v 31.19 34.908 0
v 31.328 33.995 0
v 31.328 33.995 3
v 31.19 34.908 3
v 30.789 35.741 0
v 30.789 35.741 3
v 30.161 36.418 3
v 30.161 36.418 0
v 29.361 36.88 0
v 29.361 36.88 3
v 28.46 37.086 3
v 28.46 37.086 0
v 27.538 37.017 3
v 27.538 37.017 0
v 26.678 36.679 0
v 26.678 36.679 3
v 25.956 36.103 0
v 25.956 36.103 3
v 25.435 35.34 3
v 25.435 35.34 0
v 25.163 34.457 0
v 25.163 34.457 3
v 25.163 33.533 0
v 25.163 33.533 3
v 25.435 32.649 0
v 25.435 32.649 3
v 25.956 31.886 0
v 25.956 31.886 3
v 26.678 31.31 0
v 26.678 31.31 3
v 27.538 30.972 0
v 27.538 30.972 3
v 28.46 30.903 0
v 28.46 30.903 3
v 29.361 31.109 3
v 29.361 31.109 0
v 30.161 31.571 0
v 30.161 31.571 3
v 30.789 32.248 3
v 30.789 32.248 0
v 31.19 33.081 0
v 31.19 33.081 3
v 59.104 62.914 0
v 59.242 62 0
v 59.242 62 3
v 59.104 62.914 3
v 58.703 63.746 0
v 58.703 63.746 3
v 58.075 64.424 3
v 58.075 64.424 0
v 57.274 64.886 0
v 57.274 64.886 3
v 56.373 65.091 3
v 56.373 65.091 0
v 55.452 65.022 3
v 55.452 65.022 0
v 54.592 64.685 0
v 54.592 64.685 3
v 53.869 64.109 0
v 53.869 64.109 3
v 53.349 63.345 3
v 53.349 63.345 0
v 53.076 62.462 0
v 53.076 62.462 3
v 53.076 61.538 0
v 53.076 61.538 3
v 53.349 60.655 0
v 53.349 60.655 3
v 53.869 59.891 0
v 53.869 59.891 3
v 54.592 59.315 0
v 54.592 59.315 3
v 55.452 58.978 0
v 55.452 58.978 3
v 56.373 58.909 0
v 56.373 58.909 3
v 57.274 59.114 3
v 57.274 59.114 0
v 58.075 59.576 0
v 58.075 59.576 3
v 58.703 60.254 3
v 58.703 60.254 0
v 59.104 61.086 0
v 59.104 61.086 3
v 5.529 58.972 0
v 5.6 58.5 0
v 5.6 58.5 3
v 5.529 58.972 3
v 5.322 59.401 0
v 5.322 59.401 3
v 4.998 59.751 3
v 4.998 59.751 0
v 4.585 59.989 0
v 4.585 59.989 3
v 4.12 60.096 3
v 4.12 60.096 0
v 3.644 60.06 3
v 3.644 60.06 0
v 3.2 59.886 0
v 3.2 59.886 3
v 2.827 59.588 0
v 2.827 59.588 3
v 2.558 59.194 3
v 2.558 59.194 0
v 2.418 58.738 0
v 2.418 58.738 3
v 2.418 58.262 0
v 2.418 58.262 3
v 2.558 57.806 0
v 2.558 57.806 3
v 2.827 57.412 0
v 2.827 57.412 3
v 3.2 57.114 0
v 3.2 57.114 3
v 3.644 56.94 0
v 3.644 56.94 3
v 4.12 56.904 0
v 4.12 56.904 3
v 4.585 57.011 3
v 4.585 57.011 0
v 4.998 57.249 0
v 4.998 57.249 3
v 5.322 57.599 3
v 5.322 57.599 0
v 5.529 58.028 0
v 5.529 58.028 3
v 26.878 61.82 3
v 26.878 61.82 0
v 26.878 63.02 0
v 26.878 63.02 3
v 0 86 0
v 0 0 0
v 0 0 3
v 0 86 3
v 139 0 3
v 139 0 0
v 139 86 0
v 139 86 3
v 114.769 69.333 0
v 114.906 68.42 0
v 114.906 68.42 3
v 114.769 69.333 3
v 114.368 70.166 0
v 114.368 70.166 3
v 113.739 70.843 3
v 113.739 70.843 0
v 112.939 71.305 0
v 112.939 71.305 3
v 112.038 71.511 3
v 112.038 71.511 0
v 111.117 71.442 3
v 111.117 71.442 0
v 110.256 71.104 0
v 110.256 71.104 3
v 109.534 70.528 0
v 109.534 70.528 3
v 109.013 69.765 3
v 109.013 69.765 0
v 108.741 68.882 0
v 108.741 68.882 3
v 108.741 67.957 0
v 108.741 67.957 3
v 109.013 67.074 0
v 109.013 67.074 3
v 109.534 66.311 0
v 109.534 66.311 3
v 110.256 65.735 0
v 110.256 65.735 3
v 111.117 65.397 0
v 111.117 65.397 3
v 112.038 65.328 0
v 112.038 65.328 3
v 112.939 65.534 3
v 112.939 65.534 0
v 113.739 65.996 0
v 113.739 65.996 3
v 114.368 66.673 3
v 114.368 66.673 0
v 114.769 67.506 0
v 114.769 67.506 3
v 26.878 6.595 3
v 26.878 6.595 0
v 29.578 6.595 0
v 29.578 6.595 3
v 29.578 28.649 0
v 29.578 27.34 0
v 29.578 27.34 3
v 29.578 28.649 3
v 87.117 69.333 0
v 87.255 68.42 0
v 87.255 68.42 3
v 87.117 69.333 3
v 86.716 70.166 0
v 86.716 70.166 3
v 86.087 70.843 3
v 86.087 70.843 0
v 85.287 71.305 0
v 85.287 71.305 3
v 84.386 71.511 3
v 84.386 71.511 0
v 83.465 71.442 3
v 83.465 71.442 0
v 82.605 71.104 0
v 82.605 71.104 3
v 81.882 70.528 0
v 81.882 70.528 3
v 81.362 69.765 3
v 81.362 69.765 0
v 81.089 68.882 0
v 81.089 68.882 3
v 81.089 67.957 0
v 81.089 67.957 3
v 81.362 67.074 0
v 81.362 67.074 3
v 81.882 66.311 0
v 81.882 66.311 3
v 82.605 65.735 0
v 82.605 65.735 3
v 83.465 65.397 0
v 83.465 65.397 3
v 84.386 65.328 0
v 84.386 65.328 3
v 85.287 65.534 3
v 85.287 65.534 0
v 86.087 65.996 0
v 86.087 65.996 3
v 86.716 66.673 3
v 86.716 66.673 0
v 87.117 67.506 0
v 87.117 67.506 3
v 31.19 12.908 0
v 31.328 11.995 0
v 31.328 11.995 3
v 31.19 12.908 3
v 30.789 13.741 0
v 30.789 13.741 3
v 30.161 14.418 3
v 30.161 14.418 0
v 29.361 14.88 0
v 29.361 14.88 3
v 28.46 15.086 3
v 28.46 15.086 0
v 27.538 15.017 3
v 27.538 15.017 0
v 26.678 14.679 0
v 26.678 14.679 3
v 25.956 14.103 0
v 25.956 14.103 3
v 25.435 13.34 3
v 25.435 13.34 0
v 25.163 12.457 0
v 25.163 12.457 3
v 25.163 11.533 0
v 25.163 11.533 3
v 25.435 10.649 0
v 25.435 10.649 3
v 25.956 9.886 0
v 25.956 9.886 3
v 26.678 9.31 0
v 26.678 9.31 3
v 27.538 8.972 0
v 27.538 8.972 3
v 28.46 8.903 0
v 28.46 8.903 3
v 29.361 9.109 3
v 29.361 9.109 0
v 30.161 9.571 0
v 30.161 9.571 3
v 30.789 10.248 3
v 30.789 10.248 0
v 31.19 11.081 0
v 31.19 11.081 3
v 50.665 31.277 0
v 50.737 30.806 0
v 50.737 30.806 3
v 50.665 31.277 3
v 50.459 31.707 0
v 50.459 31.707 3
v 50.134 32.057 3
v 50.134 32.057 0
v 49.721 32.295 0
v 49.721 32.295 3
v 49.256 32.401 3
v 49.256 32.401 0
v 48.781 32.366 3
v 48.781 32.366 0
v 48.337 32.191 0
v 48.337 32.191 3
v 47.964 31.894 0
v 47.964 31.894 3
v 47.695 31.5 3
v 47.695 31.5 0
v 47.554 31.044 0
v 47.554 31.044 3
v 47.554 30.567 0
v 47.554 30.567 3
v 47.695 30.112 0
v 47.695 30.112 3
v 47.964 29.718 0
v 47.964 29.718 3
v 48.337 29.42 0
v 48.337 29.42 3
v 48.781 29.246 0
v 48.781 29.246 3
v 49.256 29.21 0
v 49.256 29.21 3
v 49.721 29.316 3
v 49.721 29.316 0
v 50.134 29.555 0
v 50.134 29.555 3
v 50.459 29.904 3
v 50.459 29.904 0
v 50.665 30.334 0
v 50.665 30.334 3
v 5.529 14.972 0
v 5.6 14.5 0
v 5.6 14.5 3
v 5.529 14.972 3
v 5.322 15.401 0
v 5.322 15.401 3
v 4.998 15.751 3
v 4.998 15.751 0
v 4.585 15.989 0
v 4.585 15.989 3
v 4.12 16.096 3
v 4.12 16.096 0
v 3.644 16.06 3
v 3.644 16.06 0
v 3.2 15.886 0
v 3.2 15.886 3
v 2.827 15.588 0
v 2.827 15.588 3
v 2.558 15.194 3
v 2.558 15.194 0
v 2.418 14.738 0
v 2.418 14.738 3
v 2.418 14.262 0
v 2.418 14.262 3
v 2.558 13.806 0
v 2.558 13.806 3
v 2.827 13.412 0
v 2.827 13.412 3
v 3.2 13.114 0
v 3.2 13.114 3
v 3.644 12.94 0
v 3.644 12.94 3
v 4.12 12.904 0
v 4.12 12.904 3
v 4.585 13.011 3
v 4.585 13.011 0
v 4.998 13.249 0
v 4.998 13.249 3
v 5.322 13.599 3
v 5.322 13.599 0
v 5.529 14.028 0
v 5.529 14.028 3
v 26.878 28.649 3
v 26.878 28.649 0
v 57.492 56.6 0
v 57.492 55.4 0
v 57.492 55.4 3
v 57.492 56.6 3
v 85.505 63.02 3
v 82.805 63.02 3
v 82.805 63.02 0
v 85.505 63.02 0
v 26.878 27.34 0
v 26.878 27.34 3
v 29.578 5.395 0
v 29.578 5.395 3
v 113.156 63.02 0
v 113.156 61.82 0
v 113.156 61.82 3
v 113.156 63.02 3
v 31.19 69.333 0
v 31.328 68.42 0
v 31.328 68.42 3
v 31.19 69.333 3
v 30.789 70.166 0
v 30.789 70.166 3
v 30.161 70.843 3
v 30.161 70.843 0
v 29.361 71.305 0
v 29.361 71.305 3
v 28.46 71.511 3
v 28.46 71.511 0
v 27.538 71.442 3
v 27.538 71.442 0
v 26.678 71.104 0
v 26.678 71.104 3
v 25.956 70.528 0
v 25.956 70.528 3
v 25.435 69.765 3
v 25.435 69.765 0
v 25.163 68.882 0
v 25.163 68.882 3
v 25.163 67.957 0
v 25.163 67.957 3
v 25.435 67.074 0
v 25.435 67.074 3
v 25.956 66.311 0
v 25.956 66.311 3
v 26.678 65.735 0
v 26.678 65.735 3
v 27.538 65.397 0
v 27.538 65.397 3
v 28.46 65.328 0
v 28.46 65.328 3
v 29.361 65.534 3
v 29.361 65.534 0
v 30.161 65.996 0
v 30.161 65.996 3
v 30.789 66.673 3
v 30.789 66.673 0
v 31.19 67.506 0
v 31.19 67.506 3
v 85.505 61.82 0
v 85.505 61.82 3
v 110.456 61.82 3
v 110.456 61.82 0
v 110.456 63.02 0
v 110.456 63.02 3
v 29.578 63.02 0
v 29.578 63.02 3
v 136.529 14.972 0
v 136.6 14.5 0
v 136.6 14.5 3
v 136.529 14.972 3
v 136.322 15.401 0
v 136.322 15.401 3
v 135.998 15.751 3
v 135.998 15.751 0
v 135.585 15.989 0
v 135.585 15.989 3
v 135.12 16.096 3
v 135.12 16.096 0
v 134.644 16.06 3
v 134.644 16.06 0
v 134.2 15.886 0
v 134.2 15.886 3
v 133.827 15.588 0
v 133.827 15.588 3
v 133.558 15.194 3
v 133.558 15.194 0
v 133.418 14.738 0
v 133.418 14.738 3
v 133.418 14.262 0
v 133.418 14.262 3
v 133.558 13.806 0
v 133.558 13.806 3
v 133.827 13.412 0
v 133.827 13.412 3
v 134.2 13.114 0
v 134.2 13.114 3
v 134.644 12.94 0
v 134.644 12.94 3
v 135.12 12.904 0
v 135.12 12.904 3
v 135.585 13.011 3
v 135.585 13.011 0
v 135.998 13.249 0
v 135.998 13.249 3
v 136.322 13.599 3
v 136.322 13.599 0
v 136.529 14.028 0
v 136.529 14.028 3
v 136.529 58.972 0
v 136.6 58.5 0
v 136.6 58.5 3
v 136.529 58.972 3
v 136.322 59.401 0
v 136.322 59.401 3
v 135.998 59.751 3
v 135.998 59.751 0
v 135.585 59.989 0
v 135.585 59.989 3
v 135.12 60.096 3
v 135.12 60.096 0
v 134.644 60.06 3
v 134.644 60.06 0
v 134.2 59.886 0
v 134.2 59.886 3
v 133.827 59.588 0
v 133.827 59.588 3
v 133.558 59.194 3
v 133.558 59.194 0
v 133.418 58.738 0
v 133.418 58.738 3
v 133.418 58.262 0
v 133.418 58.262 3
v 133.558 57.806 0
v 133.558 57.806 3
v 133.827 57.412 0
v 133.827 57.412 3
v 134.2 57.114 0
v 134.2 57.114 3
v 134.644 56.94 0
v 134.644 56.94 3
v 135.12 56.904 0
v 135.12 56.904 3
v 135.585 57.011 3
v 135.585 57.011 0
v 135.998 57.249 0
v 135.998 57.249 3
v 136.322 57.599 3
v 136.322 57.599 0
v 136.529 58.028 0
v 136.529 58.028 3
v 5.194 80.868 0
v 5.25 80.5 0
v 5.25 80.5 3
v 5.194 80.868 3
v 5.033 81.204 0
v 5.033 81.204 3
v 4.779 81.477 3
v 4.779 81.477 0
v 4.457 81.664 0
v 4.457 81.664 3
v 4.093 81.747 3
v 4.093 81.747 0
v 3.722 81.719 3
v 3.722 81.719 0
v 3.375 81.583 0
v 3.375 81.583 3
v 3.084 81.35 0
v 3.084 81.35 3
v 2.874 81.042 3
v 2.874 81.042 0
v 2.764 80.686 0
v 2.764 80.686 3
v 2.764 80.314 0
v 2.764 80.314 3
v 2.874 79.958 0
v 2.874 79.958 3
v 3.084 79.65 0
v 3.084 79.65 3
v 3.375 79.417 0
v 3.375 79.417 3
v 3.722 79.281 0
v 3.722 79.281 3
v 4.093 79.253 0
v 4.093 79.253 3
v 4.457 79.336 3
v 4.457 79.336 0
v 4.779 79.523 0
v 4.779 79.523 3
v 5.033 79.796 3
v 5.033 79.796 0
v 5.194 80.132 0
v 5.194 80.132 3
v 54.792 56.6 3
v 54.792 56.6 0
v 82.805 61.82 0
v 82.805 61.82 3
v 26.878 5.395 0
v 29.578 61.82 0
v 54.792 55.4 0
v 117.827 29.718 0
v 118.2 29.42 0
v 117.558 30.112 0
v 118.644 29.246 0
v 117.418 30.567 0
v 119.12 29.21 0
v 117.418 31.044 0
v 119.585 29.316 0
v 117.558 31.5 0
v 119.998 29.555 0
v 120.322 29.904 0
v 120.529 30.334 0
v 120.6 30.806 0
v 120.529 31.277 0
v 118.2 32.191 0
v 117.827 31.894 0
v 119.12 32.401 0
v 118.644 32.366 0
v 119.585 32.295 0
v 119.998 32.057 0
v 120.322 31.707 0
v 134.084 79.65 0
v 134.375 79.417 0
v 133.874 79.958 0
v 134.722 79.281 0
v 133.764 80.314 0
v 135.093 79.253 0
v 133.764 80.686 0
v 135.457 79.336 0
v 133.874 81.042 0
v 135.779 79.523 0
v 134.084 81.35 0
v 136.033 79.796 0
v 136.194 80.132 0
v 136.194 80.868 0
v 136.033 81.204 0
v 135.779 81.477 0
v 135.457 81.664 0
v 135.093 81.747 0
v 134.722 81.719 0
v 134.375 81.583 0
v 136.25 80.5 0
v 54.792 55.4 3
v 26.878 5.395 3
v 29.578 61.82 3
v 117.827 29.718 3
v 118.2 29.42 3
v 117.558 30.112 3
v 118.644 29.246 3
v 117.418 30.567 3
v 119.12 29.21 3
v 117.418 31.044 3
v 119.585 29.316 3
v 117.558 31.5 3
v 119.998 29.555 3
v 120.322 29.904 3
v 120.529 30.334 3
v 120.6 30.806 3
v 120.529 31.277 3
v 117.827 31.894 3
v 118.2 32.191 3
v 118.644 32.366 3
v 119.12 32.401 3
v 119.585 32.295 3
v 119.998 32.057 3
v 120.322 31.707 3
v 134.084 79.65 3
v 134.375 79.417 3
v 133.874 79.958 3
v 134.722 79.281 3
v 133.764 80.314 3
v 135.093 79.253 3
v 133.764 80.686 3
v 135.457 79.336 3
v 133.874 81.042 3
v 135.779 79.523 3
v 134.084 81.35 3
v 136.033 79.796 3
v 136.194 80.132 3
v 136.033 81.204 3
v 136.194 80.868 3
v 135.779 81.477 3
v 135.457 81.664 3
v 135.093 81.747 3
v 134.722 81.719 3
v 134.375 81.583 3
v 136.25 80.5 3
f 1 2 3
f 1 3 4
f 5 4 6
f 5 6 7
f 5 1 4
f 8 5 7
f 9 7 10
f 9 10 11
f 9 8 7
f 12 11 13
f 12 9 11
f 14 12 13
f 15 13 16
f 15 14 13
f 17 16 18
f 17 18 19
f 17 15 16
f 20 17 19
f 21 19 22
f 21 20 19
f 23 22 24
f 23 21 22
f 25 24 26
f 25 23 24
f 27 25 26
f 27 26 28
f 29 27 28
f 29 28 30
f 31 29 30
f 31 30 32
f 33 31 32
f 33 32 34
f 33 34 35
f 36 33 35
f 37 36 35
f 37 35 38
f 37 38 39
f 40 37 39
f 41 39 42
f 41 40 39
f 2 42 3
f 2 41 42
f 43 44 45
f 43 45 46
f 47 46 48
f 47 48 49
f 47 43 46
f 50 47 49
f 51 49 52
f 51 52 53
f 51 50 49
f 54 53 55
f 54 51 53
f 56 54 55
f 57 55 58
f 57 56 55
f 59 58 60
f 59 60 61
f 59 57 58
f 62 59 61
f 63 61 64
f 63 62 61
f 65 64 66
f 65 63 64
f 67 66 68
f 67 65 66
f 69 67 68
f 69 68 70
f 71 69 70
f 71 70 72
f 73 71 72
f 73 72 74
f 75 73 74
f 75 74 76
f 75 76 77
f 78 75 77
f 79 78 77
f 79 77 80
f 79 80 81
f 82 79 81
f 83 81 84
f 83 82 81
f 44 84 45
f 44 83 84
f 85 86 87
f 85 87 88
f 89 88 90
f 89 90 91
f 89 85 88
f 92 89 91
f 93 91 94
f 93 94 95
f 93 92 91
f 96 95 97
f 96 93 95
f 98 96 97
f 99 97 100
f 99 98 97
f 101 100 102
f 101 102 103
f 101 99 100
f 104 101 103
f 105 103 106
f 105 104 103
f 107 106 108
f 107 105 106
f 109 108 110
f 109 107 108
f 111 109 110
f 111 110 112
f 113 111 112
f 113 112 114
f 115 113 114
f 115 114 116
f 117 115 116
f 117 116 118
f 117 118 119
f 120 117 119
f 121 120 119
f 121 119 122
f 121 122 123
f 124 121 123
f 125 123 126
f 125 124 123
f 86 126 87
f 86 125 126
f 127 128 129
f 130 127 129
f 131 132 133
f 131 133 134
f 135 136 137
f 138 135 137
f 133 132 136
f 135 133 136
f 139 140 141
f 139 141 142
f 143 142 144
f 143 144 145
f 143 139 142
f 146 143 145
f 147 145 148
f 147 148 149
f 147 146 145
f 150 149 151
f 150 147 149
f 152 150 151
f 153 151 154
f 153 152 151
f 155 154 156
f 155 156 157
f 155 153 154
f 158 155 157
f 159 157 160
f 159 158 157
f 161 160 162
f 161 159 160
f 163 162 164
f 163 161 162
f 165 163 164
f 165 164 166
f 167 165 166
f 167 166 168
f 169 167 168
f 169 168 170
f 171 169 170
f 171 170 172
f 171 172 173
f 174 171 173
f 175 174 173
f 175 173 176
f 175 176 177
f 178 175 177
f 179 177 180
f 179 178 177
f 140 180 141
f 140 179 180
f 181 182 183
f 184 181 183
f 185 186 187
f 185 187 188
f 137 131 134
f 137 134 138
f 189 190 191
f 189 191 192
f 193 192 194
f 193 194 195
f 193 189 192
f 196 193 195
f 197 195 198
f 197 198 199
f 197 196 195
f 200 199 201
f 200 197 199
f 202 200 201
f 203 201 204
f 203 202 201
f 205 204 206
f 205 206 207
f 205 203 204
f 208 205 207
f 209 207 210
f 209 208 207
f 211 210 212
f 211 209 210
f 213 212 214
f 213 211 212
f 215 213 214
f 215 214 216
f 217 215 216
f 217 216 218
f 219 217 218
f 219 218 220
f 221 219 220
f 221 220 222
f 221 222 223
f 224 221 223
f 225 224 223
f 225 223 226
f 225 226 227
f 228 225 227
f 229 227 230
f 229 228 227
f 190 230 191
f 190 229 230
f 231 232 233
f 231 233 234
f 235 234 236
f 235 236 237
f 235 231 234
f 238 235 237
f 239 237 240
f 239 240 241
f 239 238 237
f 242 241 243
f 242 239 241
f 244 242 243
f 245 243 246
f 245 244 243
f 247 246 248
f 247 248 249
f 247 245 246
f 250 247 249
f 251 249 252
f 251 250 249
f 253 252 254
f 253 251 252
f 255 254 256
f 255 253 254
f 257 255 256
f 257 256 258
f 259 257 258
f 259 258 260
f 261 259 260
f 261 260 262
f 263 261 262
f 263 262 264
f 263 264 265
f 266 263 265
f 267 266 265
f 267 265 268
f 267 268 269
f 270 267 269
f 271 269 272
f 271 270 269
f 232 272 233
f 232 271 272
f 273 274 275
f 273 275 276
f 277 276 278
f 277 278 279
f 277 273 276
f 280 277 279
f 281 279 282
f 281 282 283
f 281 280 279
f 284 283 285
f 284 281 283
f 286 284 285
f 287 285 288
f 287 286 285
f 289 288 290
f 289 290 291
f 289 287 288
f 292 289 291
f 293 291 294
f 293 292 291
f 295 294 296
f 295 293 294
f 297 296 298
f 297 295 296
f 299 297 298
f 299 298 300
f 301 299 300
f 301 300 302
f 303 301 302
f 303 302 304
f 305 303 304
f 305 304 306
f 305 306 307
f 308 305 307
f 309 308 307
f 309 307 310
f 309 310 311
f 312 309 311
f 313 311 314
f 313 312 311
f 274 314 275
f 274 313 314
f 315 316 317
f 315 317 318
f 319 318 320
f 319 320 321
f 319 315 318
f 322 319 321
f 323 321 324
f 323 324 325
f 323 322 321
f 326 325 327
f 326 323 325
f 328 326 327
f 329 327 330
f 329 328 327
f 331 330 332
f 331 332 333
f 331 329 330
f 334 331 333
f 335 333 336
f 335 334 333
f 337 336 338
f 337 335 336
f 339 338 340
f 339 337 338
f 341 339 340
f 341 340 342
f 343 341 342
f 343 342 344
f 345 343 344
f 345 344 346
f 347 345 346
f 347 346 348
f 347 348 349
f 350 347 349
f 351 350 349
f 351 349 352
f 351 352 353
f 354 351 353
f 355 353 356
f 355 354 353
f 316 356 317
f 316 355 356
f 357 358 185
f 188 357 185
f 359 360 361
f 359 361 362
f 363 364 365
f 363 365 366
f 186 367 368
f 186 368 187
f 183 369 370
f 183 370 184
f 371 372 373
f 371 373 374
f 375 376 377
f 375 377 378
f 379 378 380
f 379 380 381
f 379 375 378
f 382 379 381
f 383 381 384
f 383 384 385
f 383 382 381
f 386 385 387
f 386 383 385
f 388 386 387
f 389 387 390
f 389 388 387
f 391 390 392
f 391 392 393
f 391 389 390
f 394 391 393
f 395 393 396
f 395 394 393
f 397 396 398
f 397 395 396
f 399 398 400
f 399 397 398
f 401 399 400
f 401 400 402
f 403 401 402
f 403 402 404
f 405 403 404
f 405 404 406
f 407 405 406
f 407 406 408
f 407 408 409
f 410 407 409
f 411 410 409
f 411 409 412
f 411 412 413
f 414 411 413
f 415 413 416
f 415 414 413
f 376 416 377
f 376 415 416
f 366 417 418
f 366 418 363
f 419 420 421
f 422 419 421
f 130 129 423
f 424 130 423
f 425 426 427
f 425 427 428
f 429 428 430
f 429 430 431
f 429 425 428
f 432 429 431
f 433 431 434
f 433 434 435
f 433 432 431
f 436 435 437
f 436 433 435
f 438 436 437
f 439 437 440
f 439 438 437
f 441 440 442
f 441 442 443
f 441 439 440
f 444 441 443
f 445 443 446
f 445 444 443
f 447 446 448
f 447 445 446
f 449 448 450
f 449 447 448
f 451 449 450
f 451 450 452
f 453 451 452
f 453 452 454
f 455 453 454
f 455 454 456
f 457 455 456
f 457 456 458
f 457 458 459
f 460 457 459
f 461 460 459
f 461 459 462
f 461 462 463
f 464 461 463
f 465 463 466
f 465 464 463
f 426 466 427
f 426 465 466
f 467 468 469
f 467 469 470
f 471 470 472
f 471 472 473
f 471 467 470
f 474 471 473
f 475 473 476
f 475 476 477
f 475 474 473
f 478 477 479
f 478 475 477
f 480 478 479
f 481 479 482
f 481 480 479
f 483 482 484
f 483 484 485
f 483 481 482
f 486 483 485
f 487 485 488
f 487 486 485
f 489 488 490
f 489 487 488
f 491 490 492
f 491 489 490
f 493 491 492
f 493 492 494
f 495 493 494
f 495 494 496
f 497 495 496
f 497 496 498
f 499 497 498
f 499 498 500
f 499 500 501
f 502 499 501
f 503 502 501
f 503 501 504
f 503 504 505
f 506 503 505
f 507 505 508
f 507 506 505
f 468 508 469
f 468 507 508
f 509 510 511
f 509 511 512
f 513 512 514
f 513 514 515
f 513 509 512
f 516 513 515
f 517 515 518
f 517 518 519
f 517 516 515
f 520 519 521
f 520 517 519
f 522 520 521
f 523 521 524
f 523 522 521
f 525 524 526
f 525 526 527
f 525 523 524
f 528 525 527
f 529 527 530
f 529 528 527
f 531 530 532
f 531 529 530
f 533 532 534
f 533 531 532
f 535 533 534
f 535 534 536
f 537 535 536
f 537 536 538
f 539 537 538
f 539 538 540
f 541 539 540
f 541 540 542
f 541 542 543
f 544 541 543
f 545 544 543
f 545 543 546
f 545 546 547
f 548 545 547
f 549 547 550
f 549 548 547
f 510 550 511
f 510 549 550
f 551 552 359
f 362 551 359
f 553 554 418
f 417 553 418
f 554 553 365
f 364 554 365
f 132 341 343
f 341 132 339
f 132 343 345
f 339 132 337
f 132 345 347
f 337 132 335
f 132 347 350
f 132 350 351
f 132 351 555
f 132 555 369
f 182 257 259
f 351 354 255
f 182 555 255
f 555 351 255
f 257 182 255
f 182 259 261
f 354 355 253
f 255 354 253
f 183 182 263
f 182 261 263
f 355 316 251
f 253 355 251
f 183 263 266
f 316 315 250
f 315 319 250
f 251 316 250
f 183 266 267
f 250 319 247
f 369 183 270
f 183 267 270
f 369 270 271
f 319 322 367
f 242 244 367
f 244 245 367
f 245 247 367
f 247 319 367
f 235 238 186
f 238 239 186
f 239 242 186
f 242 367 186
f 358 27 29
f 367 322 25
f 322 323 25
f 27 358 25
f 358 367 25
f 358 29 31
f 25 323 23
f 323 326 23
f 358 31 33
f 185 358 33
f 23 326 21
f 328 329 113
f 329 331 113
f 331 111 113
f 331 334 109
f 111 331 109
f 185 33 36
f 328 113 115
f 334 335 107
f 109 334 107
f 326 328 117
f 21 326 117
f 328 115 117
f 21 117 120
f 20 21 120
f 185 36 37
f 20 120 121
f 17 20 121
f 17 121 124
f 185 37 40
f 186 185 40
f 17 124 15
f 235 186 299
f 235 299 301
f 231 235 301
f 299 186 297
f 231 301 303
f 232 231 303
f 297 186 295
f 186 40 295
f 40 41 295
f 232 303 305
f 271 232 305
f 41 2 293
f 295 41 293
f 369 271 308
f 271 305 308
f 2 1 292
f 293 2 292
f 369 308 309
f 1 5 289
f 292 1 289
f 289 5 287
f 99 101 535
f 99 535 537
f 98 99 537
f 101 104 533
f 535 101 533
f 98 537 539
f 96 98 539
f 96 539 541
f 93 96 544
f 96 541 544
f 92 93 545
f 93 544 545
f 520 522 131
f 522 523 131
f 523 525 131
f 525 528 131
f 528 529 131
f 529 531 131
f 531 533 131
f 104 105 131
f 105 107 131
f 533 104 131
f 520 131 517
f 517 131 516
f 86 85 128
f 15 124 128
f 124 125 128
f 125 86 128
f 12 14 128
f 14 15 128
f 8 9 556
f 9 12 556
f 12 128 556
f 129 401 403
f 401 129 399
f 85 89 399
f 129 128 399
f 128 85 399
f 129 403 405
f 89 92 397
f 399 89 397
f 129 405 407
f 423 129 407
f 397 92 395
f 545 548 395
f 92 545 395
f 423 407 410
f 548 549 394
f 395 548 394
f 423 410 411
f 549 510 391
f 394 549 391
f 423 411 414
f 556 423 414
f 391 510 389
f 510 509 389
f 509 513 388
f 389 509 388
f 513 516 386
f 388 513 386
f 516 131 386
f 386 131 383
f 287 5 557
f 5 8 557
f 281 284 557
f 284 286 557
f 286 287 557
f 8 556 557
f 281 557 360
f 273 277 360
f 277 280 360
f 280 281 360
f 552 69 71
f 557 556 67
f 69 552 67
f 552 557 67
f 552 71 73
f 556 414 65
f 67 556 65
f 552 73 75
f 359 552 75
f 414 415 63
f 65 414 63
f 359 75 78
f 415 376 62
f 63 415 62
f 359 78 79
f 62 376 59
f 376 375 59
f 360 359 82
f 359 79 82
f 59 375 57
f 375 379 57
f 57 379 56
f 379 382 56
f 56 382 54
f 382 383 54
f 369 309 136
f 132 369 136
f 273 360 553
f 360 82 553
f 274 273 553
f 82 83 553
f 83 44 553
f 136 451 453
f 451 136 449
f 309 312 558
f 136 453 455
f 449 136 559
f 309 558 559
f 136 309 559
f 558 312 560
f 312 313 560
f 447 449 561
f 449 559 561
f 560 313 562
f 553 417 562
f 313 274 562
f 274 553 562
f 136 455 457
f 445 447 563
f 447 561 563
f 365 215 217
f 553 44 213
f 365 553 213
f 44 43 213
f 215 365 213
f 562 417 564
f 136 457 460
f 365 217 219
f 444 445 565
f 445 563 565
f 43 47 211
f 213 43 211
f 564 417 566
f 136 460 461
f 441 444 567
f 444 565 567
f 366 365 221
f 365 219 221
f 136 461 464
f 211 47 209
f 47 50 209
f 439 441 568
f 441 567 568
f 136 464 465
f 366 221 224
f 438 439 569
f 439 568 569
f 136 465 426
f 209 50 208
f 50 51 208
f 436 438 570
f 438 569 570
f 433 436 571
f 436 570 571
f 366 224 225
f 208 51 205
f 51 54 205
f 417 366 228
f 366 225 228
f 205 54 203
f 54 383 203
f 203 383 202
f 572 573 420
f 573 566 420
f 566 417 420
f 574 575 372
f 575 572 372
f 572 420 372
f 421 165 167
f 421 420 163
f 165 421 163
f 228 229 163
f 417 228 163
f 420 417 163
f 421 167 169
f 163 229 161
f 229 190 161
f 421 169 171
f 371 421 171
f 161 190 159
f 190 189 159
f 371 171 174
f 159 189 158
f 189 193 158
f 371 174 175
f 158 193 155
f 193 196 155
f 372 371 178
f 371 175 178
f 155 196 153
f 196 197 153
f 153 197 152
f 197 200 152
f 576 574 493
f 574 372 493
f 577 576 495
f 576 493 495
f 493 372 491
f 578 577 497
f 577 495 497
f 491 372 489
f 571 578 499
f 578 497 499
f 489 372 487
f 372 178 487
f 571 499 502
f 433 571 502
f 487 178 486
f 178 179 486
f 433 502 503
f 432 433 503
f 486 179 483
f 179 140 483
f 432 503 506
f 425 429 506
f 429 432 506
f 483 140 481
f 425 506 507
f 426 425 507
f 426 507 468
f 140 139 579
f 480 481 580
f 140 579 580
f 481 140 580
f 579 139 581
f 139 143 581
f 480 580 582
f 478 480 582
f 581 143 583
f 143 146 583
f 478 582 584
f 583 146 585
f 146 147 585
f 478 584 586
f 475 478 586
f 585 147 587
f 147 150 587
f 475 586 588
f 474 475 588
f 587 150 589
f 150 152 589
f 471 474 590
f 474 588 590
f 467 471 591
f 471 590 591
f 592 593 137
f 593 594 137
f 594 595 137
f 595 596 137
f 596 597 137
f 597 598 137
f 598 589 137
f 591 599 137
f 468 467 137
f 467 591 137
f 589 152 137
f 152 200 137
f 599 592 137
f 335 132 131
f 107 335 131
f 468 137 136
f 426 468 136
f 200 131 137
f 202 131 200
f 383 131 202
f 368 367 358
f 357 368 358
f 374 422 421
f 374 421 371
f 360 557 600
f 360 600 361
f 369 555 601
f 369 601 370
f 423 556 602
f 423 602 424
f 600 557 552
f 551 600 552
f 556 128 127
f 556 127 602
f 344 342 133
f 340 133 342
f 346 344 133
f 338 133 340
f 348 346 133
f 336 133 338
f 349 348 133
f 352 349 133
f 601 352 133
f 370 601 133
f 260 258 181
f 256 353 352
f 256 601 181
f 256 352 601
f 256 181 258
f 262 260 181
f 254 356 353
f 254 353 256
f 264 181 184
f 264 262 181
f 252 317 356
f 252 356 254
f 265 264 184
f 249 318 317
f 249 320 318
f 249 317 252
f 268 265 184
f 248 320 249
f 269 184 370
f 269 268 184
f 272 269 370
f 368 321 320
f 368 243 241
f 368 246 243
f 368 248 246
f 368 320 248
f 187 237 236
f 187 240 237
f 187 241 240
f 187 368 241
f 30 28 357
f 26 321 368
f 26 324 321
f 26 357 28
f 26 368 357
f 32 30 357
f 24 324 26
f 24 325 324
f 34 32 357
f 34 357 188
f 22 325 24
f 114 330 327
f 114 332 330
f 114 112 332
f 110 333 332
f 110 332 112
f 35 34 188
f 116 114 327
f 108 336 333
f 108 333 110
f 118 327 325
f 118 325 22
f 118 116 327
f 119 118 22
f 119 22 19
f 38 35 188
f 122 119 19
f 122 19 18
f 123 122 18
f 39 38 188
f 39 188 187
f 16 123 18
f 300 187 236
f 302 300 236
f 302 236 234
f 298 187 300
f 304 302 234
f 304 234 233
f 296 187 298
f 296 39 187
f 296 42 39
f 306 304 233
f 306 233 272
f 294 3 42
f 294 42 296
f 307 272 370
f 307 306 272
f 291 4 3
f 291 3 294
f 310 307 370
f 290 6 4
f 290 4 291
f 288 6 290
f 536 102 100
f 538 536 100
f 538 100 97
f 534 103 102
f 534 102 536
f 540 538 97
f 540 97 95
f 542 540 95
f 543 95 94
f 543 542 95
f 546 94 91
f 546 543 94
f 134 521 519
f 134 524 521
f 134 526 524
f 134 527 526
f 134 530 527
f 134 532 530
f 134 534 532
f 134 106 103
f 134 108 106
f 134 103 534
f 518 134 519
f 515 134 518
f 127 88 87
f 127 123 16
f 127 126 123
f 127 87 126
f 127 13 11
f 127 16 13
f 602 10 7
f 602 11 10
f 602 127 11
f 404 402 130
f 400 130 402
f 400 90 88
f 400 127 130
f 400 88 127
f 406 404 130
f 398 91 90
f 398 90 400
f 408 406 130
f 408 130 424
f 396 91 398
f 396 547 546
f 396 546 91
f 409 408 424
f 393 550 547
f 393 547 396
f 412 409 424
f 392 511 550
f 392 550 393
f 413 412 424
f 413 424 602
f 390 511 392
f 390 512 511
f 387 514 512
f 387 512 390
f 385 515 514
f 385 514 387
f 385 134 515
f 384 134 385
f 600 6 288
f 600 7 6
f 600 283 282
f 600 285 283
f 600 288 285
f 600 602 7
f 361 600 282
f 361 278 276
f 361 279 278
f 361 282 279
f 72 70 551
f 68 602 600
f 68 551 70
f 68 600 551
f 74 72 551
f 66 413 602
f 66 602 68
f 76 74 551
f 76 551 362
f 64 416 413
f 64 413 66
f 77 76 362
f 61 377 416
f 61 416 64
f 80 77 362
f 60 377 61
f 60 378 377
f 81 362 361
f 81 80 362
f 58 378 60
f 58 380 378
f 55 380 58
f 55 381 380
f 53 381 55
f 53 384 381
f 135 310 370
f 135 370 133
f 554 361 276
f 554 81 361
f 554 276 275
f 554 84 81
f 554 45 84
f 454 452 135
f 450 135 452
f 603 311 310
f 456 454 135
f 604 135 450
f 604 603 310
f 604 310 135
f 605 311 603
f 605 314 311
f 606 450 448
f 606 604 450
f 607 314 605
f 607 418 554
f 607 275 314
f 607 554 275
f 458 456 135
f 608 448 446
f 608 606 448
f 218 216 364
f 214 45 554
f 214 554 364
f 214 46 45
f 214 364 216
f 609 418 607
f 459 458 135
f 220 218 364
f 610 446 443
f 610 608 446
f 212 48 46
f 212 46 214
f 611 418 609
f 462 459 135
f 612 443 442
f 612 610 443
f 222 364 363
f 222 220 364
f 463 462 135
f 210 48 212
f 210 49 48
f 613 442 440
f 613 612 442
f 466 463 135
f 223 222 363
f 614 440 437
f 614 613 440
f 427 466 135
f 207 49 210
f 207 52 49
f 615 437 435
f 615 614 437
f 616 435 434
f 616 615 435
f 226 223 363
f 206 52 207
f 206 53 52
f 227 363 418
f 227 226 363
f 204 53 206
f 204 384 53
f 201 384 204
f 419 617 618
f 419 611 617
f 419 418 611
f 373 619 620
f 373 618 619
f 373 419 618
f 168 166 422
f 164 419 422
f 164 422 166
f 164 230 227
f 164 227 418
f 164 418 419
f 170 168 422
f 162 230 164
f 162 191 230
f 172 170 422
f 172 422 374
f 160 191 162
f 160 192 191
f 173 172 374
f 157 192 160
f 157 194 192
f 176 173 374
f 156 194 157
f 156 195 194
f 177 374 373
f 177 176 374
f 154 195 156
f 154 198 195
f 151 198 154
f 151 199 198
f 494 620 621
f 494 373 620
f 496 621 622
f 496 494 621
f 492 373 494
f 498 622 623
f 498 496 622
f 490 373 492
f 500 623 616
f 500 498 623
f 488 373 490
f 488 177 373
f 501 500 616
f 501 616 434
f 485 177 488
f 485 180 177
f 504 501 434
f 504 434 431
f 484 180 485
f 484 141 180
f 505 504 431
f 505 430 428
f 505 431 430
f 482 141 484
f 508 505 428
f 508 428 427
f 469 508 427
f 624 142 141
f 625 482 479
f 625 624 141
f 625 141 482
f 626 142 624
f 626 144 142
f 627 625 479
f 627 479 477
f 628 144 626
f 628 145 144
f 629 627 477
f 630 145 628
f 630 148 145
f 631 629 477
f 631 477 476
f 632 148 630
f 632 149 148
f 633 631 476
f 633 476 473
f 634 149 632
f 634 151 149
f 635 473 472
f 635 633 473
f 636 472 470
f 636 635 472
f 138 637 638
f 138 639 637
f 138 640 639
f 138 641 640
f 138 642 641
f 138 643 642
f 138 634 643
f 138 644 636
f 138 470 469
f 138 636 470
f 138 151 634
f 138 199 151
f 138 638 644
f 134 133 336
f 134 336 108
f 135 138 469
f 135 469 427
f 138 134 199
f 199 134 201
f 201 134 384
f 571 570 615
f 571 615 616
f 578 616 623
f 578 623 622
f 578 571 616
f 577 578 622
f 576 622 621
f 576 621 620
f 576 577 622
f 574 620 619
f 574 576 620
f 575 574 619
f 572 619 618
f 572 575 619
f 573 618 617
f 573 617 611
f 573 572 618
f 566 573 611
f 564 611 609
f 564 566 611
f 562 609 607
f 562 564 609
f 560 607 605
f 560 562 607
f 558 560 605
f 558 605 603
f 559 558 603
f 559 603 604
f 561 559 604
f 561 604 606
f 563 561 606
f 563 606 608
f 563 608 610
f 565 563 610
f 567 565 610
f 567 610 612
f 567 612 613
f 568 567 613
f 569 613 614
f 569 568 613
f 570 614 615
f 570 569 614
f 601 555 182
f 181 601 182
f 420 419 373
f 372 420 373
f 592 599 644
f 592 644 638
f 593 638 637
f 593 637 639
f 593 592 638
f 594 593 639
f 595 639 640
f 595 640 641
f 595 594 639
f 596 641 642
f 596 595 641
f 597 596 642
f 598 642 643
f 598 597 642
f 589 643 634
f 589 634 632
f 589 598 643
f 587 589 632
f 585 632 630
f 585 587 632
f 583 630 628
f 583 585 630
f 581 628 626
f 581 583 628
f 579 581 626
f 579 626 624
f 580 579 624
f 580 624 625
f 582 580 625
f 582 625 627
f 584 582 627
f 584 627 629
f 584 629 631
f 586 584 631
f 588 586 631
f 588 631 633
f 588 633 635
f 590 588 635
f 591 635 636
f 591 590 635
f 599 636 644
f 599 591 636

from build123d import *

# Parameters (mm, degrees)
SKETCH1_W           = 139
SKETCH1_H           = 86
SKETCH1_R           = 1.6
SKETCH1_R_2         = 3.1
SKETCH1_R_3         = 1.25
SKETCH1_W_2         = 2.7
SKETCH1_H_2         = 1.2
SKETCH1_H_3         = 1.309440744
BOSS_EXTRUDE1_DEPTH = 3


with BuildPart() as part:
    # Sketch1 → Boss-Extrude1 (new body)
    with BuildSketch(Plane.XY):
        with Locations((69.5, 43)):
            Rectangle(SKETCH1_W, SKETCH1_H)
        with Locations((4, 58.5)):
            Circle(SKETCH1_R, mode=Mode.SUBTRACT)
        with Locations((135, 58.5)):
            Circle(SKETCH1_R, mode=Mode.SUBTRACT)
        with Locations((135, 14.5)):
            Circle(SKETCH1_R, mode=Mode.SUBTRACT)
        with Locations((4, 14.5)):
            Circle(SKETCH1_R, mode=Mode.SUBTRACT)
        with Locations((49.136550625, 30.80578632)):
            Circle(SKETCH1_R, mode=Mode.SUBTRACT)
        with Locations((119, 30.80578632)):
            Circle(SKETCH1_R, mode=Mode.SUBTRACT)
        with Locations((56.141769292, 62)):
            Circle(SKETCH1_R_2, mode=Mode.SUBTRACT)
        with Locations((28.227965057, 11.99453943)):
            Circle(SKETCH1_R_2, mode=Mode.SUBTRACT)
        with Locations((111.806450526, 68.419506212)):
            Circle(SKETCH1_R_2, mode=Mode.SUBTRACT)
        with Locations((84.154646153, 68.419506212)):
            Circle(SKETCH1_R_2, mode=Mode.SUBTRACT)
        with Locations((135, 80.5)):
            Circle(SKETCH1_R_3, mode=Mode.SUBTRACT)
        with Locations((4, 80.5)):
            Circle(SKETCH1_R_3, mode=Mode.SUBTRACT)
        with Locations((28.227965057, 68.419506212)):
            Circle(SKETCH1_R_2, mode=Mode.SUBTRACT)
        with Locations((28.227965057, 33.99453943)):
            Circle(SKETCH1_R_2, mode=Mode.SUBTRACT)
        with Locations((28.227965057, 5.99453943)):
            Rectangle(SKETCH1_W_2, SKETCH1_H_2, mode=Mode.SUBTRACT)
        with Locations((84.154646153, 62.419506212)):
            Rectangle(SKETCH1_W_2, SKETCH1_H_2, mode=Mode.SUBTRACT)
        with Locations((56.141769292, 56)):
            Rectangle(SKETCH1_W_2, SKETCH1_H_2, mode=Mode.SUBTRACT)
        with Locations((111.806450526, 62.419506212)):
            Rectangle(SKETCH1_W_2, SKETCH1_H_2, mode=Mode.SUBTRACT)
        with Locations((28.227965057, 62.419506212)):
            Rectangle(SKETCH1_W_2, SKETCH1_H_2, mode=Mode.SUBTRACT)
        with Locations((28.227965057, 27.99453943)):
            Rectangle(SKETCH1_W_2, SKETCH1_H_3, mode=Mode.SUBTRACT)
    extrude(amount=BOSS_EXTRUDE1_DEPTH)


solid = part.part
